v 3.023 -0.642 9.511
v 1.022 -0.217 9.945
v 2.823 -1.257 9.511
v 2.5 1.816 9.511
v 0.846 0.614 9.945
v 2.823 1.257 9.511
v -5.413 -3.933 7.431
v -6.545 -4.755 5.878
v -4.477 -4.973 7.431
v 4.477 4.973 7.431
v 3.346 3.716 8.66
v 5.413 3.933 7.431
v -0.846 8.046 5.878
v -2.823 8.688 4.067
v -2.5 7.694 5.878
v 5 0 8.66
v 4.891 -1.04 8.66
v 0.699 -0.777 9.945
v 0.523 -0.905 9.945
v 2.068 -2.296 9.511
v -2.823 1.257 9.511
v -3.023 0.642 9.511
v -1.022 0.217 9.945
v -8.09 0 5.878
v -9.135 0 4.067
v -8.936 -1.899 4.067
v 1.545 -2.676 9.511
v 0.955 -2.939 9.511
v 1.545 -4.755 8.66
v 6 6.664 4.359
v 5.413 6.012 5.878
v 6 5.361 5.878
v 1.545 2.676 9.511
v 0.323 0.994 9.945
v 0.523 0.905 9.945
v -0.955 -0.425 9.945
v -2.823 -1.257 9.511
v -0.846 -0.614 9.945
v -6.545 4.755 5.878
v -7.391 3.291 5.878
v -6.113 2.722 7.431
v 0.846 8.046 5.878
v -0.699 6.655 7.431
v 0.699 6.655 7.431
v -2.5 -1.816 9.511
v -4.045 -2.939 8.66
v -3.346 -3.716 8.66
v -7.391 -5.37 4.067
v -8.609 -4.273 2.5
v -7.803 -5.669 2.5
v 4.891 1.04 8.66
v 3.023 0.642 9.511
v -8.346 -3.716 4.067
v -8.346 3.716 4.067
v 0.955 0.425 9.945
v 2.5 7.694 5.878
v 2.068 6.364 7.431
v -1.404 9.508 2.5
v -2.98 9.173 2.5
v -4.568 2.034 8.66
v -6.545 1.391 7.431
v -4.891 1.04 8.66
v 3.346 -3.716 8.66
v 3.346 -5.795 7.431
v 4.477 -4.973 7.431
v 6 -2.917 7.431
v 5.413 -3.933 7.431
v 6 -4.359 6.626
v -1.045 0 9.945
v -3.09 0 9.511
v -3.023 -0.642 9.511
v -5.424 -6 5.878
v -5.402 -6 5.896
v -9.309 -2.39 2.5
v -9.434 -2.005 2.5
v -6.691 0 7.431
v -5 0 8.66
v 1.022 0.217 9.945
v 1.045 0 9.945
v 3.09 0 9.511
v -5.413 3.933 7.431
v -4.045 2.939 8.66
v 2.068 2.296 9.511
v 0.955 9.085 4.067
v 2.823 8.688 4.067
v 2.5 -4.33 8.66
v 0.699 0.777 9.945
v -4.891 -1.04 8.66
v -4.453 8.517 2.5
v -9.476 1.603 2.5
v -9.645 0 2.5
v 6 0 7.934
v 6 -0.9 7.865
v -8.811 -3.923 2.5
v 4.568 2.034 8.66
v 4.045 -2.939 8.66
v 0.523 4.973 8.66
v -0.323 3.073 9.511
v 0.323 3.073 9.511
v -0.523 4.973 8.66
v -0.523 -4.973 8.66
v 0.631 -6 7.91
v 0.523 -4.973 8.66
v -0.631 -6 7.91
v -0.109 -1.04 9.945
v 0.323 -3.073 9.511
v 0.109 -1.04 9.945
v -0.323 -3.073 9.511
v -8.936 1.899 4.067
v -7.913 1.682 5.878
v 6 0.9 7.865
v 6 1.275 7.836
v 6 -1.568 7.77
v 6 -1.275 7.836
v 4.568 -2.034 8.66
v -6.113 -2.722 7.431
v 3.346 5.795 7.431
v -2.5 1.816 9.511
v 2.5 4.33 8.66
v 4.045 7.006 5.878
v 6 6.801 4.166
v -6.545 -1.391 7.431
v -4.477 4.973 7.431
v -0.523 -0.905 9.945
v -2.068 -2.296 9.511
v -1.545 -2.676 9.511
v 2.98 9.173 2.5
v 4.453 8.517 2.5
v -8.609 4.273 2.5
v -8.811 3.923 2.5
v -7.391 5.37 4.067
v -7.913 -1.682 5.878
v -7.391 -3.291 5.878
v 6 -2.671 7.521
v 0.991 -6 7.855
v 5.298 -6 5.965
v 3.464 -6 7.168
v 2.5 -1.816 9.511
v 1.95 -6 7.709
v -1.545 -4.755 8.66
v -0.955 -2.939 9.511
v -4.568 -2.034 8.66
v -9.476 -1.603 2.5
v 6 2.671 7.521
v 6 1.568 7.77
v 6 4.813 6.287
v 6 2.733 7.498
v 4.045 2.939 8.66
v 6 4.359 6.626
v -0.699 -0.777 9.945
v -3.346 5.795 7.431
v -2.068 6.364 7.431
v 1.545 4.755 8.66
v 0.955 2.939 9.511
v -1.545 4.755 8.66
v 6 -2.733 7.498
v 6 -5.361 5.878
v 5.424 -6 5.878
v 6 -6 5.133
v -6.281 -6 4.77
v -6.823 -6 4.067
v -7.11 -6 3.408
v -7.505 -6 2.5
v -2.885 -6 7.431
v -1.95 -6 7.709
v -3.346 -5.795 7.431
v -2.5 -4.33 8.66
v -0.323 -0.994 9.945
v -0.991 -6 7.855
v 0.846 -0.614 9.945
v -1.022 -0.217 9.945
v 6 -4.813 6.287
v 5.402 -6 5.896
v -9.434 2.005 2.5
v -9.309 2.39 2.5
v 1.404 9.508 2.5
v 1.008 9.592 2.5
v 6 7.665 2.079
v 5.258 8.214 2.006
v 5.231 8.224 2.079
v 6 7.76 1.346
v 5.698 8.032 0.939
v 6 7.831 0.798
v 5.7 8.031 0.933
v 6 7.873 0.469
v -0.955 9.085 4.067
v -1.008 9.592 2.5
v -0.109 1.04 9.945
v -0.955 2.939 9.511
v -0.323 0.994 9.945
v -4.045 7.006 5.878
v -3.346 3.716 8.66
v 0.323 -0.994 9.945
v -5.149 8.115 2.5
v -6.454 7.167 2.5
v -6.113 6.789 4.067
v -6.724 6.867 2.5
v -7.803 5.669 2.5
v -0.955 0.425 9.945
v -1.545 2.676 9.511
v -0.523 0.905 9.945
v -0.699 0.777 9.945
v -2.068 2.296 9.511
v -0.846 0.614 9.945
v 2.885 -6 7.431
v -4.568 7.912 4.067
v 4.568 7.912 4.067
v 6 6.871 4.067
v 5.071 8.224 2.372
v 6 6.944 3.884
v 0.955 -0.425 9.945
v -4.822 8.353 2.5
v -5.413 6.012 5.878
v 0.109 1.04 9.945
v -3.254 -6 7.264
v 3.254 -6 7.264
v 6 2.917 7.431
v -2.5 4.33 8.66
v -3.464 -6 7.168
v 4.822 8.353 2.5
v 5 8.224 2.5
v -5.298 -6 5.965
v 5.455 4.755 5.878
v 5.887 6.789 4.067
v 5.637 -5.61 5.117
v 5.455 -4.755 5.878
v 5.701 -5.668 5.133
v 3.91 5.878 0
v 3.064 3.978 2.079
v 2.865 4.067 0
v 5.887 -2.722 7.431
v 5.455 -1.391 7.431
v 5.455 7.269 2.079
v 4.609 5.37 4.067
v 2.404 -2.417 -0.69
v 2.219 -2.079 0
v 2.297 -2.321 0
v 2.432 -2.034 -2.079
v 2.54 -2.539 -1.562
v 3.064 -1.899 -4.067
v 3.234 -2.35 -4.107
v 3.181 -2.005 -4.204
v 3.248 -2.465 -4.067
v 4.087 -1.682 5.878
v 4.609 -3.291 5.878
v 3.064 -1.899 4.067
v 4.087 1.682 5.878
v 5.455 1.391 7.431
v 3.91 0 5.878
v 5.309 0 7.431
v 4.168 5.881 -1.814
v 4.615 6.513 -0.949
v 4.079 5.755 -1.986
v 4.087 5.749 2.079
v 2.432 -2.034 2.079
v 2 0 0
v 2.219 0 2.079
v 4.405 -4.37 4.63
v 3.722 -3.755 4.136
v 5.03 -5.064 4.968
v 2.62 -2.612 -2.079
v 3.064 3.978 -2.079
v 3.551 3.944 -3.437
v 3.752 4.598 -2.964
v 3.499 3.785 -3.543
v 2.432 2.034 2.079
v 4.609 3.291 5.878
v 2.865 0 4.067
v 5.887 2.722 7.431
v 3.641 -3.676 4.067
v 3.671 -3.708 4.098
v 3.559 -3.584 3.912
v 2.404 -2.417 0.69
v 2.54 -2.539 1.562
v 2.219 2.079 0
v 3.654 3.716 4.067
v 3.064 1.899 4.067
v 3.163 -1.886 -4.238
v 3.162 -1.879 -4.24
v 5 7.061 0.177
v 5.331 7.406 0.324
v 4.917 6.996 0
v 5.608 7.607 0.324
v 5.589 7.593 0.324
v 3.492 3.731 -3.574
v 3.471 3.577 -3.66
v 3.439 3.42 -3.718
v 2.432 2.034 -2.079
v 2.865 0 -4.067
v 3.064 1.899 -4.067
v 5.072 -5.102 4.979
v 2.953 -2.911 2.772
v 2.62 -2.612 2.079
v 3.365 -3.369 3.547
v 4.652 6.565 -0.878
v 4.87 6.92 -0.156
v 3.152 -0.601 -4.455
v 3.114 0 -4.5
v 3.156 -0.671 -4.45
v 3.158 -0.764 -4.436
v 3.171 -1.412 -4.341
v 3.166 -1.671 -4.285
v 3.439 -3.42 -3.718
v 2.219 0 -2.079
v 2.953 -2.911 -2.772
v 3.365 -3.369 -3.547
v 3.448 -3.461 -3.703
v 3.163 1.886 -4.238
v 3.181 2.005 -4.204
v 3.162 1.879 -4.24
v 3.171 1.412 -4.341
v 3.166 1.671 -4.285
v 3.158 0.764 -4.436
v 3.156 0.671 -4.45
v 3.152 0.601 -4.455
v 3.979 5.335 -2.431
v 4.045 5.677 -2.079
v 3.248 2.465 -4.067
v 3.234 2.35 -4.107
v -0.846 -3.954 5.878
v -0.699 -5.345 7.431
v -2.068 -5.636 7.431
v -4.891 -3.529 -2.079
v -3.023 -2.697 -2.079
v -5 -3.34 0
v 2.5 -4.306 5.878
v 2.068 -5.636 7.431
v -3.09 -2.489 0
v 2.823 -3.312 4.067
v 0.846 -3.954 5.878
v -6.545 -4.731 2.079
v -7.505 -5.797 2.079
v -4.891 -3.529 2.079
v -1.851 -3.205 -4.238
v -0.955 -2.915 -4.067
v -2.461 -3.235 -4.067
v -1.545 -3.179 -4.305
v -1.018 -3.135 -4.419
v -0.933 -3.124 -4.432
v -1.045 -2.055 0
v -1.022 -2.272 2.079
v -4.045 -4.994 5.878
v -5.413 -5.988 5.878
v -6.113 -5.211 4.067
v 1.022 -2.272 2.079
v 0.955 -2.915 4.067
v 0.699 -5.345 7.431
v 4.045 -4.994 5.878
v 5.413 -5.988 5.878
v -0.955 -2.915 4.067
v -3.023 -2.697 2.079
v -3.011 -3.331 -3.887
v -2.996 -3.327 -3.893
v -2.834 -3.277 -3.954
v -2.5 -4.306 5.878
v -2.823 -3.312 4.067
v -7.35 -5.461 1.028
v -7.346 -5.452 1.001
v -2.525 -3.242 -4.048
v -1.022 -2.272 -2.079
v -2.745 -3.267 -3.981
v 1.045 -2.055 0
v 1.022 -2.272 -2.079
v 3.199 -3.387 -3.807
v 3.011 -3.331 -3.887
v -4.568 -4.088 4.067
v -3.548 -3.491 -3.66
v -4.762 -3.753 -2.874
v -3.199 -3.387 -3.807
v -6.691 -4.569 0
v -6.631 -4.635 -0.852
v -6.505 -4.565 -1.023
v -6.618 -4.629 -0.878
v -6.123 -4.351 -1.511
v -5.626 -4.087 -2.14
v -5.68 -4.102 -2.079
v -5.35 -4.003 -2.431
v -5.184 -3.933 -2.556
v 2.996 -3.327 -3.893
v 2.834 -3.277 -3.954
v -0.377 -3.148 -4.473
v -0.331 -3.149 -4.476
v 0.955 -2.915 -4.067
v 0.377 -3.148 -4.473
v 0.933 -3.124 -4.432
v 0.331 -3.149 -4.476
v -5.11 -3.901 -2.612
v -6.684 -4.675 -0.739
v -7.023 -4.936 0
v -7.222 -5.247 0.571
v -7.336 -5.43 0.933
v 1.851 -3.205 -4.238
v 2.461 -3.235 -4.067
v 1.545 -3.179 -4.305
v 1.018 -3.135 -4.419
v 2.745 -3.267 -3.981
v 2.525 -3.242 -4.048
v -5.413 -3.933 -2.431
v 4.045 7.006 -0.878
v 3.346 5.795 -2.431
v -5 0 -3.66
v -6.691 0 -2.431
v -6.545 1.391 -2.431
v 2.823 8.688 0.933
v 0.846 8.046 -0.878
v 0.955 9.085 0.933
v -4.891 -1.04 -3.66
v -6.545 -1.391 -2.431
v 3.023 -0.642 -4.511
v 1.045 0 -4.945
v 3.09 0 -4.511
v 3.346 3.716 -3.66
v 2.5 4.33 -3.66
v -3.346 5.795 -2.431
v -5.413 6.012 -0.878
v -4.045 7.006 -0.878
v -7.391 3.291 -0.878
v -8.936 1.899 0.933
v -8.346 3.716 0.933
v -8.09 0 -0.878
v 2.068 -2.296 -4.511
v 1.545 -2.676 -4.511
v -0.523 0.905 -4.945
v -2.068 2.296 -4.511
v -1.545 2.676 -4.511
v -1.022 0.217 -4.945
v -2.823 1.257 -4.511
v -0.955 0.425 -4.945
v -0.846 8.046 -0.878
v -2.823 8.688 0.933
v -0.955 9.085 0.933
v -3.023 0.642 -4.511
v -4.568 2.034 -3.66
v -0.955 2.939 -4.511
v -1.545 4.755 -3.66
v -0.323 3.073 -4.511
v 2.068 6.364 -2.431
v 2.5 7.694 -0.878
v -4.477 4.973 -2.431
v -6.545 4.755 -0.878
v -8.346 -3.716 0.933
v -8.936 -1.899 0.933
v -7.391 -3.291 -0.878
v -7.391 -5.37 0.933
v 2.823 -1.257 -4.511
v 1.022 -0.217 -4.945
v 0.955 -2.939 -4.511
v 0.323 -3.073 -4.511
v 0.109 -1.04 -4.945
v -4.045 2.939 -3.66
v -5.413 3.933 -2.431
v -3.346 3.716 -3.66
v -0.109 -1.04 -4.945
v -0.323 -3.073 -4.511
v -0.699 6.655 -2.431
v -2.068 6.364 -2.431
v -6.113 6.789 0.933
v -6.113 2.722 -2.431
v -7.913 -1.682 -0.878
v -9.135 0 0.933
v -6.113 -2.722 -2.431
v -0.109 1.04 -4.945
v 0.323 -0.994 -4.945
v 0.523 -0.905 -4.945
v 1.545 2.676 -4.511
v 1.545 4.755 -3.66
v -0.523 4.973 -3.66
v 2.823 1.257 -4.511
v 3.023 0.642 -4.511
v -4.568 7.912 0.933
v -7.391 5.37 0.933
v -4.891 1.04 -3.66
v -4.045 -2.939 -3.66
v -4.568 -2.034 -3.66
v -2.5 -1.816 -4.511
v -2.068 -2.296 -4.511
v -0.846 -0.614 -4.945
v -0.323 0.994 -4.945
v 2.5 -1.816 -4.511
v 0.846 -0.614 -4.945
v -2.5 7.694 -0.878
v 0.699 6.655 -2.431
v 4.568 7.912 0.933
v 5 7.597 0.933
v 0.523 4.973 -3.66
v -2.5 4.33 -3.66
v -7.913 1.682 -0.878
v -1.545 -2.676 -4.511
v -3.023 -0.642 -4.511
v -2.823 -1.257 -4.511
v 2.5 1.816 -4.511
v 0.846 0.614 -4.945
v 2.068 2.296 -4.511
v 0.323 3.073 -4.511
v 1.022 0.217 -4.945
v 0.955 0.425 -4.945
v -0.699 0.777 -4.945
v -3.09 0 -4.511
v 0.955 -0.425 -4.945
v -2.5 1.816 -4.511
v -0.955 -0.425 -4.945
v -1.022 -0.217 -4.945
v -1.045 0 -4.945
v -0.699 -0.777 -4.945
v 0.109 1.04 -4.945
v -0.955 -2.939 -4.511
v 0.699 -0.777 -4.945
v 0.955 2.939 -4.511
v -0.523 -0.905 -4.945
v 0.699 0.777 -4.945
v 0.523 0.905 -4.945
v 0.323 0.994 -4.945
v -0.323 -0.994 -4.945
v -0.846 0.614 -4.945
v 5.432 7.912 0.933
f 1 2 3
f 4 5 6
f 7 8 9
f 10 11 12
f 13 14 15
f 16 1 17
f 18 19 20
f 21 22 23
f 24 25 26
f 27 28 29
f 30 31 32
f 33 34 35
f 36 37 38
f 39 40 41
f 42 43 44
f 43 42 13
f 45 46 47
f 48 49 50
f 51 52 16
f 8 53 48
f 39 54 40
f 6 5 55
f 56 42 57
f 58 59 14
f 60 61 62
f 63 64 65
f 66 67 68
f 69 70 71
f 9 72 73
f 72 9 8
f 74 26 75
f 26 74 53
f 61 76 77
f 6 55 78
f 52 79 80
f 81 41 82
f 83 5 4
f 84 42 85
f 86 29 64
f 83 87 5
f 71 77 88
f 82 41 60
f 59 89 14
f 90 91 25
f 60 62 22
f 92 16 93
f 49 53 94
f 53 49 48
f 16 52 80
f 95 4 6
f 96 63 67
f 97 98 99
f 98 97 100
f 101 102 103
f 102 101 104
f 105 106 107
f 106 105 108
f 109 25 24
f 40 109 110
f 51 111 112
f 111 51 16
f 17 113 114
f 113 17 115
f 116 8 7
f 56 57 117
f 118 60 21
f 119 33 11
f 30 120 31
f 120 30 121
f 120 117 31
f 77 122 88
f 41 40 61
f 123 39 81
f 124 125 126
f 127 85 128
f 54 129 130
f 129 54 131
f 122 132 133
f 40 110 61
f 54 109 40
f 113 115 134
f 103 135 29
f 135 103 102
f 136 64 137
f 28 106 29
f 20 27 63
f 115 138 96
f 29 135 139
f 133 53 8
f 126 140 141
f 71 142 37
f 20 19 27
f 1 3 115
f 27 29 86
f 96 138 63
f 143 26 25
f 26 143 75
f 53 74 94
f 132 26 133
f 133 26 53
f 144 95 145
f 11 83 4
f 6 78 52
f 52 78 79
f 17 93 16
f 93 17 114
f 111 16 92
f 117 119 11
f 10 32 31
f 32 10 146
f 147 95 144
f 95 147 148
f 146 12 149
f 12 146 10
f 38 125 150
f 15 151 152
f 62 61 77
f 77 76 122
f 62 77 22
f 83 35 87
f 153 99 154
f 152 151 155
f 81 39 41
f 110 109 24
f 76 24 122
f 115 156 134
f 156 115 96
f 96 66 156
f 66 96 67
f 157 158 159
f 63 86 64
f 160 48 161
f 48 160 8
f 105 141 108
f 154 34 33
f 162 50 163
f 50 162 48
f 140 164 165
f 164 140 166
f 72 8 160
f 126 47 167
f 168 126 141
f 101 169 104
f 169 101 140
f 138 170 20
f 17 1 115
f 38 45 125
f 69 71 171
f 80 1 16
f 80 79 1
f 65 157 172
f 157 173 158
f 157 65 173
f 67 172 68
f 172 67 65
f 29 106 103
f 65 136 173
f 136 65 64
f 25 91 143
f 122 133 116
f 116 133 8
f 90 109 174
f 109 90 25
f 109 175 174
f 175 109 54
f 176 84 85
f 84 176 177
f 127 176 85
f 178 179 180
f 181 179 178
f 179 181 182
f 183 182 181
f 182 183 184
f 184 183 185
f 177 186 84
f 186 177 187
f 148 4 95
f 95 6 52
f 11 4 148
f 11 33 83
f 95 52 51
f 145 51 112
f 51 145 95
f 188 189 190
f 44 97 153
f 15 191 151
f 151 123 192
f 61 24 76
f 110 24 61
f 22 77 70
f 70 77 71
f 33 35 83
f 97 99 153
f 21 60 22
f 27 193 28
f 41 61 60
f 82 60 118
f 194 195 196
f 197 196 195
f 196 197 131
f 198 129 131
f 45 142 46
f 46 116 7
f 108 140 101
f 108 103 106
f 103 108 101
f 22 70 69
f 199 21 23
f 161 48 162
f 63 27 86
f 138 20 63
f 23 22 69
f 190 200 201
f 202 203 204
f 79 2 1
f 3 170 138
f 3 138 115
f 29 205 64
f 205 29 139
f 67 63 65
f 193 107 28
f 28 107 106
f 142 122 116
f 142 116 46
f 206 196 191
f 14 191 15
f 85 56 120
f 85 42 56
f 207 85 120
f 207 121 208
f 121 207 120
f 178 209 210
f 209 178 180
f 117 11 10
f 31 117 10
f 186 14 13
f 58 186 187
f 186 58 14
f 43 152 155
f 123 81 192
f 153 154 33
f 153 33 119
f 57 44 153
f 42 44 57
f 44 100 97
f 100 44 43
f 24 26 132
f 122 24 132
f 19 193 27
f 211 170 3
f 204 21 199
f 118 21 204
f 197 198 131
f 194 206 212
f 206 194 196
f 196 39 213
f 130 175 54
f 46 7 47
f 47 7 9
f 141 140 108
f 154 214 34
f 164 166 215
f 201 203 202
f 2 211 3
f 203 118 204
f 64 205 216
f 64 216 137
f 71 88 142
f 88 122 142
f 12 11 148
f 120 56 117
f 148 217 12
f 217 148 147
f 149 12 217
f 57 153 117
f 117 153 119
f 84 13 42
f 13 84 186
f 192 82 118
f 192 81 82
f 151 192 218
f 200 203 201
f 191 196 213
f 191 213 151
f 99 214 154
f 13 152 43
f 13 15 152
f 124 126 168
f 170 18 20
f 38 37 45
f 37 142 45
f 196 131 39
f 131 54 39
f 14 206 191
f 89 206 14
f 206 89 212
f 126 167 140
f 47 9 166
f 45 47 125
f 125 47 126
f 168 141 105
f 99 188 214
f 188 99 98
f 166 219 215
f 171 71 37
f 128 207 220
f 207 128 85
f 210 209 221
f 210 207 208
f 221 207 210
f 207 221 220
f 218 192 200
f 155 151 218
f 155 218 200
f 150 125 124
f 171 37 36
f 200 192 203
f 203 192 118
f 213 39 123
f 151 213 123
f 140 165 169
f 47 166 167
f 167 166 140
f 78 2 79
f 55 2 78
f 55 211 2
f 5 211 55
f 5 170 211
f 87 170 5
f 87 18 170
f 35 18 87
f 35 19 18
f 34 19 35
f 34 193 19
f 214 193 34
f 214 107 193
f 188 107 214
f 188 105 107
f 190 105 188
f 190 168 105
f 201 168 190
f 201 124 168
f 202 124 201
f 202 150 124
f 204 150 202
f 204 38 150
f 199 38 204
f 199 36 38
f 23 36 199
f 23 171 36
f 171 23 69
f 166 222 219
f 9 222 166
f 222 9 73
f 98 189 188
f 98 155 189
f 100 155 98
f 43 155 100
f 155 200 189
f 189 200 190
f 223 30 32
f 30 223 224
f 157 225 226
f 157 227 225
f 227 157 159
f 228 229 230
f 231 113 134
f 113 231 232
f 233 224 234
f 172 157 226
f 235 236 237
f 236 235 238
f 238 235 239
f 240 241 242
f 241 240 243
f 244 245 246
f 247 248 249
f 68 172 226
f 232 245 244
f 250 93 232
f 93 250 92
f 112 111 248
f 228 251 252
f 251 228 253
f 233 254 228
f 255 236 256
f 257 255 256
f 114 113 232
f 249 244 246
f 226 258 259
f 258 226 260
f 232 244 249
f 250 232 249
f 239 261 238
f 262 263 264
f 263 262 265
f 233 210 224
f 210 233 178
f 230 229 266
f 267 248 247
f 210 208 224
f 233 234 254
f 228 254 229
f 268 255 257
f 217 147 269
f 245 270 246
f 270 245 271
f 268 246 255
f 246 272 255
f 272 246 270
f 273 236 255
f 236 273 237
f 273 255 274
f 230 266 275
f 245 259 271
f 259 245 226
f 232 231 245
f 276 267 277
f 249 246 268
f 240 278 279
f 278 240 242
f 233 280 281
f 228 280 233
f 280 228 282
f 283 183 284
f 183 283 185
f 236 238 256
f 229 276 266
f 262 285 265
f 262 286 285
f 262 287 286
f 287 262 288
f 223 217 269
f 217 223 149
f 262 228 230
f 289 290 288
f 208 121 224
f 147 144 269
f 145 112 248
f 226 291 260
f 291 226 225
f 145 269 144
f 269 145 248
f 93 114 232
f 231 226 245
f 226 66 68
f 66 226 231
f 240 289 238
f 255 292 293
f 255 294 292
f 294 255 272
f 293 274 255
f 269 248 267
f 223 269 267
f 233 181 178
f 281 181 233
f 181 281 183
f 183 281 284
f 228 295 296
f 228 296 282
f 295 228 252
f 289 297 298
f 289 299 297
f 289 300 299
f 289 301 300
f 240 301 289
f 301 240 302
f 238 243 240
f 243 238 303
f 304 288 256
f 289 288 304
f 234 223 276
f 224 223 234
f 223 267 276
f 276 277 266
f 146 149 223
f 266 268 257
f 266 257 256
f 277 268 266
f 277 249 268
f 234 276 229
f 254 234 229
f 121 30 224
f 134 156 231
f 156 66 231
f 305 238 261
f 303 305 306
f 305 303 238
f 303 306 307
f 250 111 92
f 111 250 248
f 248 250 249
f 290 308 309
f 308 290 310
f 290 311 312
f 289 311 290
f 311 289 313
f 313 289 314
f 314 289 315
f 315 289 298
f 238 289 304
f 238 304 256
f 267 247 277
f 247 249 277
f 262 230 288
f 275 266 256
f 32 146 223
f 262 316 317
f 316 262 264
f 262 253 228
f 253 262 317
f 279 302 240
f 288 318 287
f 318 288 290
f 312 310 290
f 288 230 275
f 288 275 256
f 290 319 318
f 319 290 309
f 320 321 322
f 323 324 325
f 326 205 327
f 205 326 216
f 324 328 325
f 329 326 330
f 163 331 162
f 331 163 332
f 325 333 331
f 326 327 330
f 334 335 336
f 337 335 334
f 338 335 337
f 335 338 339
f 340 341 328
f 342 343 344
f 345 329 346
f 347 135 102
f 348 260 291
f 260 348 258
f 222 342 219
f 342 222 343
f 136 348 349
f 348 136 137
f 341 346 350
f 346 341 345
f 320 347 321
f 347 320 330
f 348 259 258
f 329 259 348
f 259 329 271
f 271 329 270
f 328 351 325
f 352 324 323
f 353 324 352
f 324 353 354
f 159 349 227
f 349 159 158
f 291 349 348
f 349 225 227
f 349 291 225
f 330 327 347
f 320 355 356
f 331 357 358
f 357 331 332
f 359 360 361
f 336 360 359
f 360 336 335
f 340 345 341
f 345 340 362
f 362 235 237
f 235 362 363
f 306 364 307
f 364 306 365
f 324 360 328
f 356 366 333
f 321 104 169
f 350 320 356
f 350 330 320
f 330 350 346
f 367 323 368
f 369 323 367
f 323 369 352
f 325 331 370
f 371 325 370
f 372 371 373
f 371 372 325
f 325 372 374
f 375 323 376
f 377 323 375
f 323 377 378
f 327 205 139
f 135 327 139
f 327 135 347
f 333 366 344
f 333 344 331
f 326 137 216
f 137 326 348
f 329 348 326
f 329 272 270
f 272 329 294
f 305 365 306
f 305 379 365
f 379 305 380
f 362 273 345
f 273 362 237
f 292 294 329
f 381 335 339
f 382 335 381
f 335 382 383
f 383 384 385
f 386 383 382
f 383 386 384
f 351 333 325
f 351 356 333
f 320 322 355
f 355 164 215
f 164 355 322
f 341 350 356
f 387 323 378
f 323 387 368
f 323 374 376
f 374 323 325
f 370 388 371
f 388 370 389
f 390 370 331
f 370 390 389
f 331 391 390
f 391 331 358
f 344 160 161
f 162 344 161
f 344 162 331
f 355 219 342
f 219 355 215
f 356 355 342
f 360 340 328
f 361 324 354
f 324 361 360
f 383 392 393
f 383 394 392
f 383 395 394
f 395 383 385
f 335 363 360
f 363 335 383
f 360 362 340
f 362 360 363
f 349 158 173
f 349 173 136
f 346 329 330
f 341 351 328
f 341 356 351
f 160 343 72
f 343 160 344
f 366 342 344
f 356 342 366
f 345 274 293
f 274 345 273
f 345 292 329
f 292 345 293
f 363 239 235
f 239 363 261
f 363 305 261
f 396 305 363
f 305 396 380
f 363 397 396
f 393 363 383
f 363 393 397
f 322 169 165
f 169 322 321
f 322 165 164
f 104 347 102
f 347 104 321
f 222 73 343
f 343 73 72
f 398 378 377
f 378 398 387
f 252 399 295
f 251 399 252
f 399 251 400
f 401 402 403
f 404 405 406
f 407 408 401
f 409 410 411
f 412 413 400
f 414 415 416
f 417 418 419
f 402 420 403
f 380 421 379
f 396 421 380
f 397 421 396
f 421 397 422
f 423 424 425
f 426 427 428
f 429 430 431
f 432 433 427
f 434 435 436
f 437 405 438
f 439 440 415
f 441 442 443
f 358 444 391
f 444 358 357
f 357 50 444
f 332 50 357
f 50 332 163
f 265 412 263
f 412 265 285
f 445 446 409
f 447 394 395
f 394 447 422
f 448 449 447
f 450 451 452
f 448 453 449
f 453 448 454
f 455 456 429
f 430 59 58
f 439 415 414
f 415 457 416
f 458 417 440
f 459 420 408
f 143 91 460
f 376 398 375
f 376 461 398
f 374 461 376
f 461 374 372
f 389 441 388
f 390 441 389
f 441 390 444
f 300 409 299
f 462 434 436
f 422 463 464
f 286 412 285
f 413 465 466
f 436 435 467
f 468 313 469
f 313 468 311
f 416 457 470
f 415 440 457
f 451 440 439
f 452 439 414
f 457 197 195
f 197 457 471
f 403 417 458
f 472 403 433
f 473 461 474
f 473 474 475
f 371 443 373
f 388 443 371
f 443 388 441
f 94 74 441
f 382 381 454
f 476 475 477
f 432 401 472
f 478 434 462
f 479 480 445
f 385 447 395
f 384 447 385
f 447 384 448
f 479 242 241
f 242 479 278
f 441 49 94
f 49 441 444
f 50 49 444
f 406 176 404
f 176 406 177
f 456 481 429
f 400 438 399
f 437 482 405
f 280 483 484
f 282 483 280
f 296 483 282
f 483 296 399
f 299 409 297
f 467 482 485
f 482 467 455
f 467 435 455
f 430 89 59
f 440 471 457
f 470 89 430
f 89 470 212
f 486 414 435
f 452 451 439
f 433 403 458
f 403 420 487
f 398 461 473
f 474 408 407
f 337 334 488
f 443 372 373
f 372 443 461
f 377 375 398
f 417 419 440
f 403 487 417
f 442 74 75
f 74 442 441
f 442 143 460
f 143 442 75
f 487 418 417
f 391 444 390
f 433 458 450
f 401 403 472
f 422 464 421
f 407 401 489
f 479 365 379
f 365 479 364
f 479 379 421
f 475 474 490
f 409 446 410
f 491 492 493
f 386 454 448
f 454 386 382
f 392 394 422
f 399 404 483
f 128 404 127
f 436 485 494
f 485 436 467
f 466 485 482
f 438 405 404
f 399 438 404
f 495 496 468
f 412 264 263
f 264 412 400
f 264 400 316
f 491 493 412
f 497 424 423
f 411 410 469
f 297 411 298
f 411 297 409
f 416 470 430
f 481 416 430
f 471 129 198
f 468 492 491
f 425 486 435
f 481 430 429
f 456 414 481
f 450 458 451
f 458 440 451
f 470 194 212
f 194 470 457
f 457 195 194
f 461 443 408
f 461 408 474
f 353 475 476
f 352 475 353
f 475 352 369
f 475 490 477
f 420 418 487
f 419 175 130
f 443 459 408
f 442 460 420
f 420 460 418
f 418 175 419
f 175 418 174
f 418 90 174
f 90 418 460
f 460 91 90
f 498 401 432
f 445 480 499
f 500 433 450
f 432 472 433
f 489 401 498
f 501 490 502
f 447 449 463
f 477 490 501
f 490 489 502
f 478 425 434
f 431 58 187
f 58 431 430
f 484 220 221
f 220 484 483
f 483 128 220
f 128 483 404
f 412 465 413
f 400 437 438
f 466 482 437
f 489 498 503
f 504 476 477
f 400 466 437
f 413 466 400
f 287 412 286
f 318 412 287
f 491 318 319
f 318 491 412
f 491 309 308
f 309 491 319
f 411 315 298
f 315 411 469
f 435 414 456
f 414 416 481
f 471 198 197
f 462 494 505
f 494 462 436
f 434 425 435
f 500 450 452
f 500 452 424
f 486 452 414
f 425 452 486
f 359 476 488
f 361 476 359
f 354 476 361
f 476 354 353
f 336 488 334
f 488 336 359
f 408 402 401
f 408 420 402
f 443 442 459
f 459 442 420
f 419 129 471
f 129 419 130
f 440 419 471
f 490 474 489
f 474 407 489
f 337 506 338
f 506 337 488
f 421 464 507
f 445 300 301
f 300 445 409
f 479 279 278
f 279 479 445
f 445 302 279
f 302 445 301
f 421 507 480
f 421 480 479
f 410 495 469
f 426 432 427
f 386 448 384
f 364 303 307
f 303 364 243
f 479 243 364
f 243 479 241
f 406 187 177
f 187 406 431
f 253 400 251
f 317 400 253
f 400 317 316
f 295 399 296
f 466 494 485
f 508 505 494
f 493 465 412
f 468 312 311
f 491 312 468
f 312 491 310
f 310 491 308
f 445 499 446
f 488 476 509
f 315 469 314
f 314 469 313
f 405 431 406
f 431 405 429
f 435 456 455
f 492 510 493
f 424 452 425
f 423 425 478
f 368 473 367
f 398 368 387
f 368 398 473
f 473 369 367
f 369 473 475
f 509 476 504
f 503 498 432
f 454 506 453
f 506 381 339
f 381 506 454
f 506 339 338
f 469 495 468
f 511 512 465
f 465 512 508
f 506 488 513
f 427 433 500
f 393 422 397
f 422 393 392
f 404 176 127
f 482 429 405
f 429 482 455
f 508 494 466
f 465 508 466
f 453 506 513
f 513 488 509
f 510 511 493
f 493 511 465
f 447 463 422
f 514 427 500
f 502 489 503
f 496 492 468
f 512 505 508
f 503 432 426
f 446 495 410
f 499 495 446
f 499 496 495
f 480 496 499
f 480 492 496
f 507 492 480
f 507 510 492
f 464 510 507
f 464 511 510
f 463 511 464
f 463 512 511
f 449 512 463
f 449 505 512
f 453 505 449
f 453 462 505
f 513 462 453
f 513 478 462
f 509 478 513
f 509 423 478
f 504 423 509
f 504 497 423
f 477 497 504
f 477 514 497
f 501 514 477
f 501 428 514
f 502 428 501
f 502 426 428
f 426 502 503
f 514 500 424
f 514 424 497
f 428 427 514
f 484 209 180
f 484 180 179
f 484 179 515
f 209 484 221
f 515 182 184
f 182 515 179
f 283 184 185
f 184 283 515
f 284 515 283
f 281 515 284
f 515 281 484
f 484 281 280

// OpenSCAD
intersection() {
difference() {
    sphere(r=10);
    translate([12,0,0])
        sphere(r=10);

    translate([0, -12, 0]) {
        sphere(r=10);
    }
}

union() {
translate([0, 0, 5]) {
    sphere(r=10);
}
translate([10, 0, 5]) {
    sphere(r=10);
}
}
}
